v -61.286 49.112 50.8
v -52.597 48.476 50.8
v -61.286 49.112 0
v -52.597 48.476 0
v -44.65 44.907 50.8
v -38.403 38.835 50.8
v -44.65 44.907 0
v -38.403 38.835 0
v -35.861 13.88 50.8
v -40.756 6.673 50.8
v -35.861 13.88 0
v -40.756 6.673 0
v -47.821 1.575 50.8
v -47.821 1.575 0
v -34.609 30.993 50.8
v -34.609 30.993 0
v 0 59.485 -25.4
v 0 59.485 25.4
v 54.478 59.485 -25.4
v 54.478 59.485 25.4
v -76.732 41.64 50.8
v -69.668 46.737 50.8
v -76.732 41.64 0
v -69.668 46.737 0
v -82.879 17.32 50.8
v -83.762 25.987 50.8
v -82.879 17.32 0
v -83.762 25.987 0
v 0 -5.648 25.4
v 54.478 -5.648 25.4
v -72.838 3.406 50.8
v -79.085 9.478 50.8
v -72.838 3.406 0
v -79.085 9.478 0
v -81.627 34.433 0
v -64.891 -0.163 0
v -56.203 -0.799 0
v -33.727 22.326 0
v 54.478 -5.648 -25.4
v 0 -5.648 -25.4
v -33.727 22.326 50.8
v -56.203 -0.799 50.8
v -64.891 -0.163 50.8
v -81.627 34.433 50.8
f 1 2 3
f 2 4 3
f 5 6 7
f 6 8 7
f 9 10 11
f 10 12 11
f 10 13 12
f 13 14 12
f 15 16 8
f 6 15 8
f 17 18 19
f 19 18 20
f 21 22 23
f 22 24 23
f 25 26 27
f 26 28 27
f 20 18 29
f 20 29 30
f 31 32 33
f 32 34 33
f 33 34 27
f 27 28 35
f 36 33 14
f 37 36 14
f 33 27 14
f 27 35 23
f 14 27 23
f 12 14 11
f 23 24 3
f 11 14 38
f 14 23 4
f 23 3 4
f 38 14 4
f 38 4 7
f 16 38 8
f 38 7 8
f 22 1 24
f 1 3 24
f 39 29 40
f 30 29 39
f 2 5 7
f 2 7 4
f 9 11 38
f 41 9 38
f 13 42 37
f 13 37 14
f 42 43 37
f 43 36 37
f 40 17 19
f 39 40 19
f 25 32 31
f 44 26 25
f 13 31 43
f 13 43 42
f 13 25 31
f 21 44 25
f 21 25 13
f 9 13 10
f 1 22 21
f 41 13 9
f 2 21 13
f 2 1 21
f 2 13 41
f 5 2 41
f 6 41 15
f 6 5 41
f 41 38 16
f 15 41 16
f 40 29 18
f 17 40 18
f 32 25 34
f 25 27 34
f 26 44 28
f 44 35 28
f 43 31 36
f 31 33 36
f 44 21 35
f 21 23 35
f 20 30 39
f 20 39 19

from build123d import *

# Parameters (mm, degrees)
F1_DEPTH = 25.4
F2_DEPTH = 25.4
F3_W     = 54.4781722128
F3_H     = 65.1334398426
F4_DEPTH = 25.4
F6_DEPTH = 25.4


# Not quite as in the source:
# - a feature of the source that left no trace in its solid (it failed there, or was rolled back) is left out


with BuildPart() as f1:
    # F0 (on Top) → F1 (new body)
    with BuildSketch(Plane.XY):
        Polygon((-34.6092643811, 30.9926864128), (-38.4029460476, 38.8350266595), (-44.6500790503, 44.9069003716), (-52.5971669514, 48.4759499683), (-61.2856736633, 49.1116953946), (-69.667637048, 46.7374563695), (-76.7320686166, 41.6396011594), (-81.6268936621, 34.4330063391), (-83.7617240441, 25.9868936018), (-82.8790677116, 17.319988795), (-79.0853860452, 9.4776485484), (-72.8382530424, 3.4057748362), (-64.8911651414, -0.1632747605), (-56.2026584294, -0.7990201868), (-47.8206950447, 1.5752188384), (-40.7562634761, 6.6730740484), (-35.8614384306, 13.8796688688), (-33.7266080487, 22.3257816061), align=None)
    extrude(amount=F1_DEPTH)

    # F2 (add): a face of the model
    f2_faces = [f1.faces().sort_by_distance(p)[0] for p in [
        (-58.7441660464, 24.1563376039, 25.4),
    ]]
    extrude(f2_faces, amount=F2_DEPTH)


with BuildPart() as f4:
    # F3 (on Top) → F4 (new body)
    with BuildSketch(Plane.XY):
        with Locations((27.2390861064, 26.9183467608)):
            Rectangle(F3_W, F3_H)
    extrude(amount=F4_DEPTH)

    # F6 (add): a face of the model
    f6_faces = [f4.faces().sort_by_distance(p)[0] for p in [
        (27.2390861064, 26.9183467608, 0),
    ]]
    extrude(f6_faces, amount=F6_DEPTH)


solid = Compound([f1.part, f4.part])
